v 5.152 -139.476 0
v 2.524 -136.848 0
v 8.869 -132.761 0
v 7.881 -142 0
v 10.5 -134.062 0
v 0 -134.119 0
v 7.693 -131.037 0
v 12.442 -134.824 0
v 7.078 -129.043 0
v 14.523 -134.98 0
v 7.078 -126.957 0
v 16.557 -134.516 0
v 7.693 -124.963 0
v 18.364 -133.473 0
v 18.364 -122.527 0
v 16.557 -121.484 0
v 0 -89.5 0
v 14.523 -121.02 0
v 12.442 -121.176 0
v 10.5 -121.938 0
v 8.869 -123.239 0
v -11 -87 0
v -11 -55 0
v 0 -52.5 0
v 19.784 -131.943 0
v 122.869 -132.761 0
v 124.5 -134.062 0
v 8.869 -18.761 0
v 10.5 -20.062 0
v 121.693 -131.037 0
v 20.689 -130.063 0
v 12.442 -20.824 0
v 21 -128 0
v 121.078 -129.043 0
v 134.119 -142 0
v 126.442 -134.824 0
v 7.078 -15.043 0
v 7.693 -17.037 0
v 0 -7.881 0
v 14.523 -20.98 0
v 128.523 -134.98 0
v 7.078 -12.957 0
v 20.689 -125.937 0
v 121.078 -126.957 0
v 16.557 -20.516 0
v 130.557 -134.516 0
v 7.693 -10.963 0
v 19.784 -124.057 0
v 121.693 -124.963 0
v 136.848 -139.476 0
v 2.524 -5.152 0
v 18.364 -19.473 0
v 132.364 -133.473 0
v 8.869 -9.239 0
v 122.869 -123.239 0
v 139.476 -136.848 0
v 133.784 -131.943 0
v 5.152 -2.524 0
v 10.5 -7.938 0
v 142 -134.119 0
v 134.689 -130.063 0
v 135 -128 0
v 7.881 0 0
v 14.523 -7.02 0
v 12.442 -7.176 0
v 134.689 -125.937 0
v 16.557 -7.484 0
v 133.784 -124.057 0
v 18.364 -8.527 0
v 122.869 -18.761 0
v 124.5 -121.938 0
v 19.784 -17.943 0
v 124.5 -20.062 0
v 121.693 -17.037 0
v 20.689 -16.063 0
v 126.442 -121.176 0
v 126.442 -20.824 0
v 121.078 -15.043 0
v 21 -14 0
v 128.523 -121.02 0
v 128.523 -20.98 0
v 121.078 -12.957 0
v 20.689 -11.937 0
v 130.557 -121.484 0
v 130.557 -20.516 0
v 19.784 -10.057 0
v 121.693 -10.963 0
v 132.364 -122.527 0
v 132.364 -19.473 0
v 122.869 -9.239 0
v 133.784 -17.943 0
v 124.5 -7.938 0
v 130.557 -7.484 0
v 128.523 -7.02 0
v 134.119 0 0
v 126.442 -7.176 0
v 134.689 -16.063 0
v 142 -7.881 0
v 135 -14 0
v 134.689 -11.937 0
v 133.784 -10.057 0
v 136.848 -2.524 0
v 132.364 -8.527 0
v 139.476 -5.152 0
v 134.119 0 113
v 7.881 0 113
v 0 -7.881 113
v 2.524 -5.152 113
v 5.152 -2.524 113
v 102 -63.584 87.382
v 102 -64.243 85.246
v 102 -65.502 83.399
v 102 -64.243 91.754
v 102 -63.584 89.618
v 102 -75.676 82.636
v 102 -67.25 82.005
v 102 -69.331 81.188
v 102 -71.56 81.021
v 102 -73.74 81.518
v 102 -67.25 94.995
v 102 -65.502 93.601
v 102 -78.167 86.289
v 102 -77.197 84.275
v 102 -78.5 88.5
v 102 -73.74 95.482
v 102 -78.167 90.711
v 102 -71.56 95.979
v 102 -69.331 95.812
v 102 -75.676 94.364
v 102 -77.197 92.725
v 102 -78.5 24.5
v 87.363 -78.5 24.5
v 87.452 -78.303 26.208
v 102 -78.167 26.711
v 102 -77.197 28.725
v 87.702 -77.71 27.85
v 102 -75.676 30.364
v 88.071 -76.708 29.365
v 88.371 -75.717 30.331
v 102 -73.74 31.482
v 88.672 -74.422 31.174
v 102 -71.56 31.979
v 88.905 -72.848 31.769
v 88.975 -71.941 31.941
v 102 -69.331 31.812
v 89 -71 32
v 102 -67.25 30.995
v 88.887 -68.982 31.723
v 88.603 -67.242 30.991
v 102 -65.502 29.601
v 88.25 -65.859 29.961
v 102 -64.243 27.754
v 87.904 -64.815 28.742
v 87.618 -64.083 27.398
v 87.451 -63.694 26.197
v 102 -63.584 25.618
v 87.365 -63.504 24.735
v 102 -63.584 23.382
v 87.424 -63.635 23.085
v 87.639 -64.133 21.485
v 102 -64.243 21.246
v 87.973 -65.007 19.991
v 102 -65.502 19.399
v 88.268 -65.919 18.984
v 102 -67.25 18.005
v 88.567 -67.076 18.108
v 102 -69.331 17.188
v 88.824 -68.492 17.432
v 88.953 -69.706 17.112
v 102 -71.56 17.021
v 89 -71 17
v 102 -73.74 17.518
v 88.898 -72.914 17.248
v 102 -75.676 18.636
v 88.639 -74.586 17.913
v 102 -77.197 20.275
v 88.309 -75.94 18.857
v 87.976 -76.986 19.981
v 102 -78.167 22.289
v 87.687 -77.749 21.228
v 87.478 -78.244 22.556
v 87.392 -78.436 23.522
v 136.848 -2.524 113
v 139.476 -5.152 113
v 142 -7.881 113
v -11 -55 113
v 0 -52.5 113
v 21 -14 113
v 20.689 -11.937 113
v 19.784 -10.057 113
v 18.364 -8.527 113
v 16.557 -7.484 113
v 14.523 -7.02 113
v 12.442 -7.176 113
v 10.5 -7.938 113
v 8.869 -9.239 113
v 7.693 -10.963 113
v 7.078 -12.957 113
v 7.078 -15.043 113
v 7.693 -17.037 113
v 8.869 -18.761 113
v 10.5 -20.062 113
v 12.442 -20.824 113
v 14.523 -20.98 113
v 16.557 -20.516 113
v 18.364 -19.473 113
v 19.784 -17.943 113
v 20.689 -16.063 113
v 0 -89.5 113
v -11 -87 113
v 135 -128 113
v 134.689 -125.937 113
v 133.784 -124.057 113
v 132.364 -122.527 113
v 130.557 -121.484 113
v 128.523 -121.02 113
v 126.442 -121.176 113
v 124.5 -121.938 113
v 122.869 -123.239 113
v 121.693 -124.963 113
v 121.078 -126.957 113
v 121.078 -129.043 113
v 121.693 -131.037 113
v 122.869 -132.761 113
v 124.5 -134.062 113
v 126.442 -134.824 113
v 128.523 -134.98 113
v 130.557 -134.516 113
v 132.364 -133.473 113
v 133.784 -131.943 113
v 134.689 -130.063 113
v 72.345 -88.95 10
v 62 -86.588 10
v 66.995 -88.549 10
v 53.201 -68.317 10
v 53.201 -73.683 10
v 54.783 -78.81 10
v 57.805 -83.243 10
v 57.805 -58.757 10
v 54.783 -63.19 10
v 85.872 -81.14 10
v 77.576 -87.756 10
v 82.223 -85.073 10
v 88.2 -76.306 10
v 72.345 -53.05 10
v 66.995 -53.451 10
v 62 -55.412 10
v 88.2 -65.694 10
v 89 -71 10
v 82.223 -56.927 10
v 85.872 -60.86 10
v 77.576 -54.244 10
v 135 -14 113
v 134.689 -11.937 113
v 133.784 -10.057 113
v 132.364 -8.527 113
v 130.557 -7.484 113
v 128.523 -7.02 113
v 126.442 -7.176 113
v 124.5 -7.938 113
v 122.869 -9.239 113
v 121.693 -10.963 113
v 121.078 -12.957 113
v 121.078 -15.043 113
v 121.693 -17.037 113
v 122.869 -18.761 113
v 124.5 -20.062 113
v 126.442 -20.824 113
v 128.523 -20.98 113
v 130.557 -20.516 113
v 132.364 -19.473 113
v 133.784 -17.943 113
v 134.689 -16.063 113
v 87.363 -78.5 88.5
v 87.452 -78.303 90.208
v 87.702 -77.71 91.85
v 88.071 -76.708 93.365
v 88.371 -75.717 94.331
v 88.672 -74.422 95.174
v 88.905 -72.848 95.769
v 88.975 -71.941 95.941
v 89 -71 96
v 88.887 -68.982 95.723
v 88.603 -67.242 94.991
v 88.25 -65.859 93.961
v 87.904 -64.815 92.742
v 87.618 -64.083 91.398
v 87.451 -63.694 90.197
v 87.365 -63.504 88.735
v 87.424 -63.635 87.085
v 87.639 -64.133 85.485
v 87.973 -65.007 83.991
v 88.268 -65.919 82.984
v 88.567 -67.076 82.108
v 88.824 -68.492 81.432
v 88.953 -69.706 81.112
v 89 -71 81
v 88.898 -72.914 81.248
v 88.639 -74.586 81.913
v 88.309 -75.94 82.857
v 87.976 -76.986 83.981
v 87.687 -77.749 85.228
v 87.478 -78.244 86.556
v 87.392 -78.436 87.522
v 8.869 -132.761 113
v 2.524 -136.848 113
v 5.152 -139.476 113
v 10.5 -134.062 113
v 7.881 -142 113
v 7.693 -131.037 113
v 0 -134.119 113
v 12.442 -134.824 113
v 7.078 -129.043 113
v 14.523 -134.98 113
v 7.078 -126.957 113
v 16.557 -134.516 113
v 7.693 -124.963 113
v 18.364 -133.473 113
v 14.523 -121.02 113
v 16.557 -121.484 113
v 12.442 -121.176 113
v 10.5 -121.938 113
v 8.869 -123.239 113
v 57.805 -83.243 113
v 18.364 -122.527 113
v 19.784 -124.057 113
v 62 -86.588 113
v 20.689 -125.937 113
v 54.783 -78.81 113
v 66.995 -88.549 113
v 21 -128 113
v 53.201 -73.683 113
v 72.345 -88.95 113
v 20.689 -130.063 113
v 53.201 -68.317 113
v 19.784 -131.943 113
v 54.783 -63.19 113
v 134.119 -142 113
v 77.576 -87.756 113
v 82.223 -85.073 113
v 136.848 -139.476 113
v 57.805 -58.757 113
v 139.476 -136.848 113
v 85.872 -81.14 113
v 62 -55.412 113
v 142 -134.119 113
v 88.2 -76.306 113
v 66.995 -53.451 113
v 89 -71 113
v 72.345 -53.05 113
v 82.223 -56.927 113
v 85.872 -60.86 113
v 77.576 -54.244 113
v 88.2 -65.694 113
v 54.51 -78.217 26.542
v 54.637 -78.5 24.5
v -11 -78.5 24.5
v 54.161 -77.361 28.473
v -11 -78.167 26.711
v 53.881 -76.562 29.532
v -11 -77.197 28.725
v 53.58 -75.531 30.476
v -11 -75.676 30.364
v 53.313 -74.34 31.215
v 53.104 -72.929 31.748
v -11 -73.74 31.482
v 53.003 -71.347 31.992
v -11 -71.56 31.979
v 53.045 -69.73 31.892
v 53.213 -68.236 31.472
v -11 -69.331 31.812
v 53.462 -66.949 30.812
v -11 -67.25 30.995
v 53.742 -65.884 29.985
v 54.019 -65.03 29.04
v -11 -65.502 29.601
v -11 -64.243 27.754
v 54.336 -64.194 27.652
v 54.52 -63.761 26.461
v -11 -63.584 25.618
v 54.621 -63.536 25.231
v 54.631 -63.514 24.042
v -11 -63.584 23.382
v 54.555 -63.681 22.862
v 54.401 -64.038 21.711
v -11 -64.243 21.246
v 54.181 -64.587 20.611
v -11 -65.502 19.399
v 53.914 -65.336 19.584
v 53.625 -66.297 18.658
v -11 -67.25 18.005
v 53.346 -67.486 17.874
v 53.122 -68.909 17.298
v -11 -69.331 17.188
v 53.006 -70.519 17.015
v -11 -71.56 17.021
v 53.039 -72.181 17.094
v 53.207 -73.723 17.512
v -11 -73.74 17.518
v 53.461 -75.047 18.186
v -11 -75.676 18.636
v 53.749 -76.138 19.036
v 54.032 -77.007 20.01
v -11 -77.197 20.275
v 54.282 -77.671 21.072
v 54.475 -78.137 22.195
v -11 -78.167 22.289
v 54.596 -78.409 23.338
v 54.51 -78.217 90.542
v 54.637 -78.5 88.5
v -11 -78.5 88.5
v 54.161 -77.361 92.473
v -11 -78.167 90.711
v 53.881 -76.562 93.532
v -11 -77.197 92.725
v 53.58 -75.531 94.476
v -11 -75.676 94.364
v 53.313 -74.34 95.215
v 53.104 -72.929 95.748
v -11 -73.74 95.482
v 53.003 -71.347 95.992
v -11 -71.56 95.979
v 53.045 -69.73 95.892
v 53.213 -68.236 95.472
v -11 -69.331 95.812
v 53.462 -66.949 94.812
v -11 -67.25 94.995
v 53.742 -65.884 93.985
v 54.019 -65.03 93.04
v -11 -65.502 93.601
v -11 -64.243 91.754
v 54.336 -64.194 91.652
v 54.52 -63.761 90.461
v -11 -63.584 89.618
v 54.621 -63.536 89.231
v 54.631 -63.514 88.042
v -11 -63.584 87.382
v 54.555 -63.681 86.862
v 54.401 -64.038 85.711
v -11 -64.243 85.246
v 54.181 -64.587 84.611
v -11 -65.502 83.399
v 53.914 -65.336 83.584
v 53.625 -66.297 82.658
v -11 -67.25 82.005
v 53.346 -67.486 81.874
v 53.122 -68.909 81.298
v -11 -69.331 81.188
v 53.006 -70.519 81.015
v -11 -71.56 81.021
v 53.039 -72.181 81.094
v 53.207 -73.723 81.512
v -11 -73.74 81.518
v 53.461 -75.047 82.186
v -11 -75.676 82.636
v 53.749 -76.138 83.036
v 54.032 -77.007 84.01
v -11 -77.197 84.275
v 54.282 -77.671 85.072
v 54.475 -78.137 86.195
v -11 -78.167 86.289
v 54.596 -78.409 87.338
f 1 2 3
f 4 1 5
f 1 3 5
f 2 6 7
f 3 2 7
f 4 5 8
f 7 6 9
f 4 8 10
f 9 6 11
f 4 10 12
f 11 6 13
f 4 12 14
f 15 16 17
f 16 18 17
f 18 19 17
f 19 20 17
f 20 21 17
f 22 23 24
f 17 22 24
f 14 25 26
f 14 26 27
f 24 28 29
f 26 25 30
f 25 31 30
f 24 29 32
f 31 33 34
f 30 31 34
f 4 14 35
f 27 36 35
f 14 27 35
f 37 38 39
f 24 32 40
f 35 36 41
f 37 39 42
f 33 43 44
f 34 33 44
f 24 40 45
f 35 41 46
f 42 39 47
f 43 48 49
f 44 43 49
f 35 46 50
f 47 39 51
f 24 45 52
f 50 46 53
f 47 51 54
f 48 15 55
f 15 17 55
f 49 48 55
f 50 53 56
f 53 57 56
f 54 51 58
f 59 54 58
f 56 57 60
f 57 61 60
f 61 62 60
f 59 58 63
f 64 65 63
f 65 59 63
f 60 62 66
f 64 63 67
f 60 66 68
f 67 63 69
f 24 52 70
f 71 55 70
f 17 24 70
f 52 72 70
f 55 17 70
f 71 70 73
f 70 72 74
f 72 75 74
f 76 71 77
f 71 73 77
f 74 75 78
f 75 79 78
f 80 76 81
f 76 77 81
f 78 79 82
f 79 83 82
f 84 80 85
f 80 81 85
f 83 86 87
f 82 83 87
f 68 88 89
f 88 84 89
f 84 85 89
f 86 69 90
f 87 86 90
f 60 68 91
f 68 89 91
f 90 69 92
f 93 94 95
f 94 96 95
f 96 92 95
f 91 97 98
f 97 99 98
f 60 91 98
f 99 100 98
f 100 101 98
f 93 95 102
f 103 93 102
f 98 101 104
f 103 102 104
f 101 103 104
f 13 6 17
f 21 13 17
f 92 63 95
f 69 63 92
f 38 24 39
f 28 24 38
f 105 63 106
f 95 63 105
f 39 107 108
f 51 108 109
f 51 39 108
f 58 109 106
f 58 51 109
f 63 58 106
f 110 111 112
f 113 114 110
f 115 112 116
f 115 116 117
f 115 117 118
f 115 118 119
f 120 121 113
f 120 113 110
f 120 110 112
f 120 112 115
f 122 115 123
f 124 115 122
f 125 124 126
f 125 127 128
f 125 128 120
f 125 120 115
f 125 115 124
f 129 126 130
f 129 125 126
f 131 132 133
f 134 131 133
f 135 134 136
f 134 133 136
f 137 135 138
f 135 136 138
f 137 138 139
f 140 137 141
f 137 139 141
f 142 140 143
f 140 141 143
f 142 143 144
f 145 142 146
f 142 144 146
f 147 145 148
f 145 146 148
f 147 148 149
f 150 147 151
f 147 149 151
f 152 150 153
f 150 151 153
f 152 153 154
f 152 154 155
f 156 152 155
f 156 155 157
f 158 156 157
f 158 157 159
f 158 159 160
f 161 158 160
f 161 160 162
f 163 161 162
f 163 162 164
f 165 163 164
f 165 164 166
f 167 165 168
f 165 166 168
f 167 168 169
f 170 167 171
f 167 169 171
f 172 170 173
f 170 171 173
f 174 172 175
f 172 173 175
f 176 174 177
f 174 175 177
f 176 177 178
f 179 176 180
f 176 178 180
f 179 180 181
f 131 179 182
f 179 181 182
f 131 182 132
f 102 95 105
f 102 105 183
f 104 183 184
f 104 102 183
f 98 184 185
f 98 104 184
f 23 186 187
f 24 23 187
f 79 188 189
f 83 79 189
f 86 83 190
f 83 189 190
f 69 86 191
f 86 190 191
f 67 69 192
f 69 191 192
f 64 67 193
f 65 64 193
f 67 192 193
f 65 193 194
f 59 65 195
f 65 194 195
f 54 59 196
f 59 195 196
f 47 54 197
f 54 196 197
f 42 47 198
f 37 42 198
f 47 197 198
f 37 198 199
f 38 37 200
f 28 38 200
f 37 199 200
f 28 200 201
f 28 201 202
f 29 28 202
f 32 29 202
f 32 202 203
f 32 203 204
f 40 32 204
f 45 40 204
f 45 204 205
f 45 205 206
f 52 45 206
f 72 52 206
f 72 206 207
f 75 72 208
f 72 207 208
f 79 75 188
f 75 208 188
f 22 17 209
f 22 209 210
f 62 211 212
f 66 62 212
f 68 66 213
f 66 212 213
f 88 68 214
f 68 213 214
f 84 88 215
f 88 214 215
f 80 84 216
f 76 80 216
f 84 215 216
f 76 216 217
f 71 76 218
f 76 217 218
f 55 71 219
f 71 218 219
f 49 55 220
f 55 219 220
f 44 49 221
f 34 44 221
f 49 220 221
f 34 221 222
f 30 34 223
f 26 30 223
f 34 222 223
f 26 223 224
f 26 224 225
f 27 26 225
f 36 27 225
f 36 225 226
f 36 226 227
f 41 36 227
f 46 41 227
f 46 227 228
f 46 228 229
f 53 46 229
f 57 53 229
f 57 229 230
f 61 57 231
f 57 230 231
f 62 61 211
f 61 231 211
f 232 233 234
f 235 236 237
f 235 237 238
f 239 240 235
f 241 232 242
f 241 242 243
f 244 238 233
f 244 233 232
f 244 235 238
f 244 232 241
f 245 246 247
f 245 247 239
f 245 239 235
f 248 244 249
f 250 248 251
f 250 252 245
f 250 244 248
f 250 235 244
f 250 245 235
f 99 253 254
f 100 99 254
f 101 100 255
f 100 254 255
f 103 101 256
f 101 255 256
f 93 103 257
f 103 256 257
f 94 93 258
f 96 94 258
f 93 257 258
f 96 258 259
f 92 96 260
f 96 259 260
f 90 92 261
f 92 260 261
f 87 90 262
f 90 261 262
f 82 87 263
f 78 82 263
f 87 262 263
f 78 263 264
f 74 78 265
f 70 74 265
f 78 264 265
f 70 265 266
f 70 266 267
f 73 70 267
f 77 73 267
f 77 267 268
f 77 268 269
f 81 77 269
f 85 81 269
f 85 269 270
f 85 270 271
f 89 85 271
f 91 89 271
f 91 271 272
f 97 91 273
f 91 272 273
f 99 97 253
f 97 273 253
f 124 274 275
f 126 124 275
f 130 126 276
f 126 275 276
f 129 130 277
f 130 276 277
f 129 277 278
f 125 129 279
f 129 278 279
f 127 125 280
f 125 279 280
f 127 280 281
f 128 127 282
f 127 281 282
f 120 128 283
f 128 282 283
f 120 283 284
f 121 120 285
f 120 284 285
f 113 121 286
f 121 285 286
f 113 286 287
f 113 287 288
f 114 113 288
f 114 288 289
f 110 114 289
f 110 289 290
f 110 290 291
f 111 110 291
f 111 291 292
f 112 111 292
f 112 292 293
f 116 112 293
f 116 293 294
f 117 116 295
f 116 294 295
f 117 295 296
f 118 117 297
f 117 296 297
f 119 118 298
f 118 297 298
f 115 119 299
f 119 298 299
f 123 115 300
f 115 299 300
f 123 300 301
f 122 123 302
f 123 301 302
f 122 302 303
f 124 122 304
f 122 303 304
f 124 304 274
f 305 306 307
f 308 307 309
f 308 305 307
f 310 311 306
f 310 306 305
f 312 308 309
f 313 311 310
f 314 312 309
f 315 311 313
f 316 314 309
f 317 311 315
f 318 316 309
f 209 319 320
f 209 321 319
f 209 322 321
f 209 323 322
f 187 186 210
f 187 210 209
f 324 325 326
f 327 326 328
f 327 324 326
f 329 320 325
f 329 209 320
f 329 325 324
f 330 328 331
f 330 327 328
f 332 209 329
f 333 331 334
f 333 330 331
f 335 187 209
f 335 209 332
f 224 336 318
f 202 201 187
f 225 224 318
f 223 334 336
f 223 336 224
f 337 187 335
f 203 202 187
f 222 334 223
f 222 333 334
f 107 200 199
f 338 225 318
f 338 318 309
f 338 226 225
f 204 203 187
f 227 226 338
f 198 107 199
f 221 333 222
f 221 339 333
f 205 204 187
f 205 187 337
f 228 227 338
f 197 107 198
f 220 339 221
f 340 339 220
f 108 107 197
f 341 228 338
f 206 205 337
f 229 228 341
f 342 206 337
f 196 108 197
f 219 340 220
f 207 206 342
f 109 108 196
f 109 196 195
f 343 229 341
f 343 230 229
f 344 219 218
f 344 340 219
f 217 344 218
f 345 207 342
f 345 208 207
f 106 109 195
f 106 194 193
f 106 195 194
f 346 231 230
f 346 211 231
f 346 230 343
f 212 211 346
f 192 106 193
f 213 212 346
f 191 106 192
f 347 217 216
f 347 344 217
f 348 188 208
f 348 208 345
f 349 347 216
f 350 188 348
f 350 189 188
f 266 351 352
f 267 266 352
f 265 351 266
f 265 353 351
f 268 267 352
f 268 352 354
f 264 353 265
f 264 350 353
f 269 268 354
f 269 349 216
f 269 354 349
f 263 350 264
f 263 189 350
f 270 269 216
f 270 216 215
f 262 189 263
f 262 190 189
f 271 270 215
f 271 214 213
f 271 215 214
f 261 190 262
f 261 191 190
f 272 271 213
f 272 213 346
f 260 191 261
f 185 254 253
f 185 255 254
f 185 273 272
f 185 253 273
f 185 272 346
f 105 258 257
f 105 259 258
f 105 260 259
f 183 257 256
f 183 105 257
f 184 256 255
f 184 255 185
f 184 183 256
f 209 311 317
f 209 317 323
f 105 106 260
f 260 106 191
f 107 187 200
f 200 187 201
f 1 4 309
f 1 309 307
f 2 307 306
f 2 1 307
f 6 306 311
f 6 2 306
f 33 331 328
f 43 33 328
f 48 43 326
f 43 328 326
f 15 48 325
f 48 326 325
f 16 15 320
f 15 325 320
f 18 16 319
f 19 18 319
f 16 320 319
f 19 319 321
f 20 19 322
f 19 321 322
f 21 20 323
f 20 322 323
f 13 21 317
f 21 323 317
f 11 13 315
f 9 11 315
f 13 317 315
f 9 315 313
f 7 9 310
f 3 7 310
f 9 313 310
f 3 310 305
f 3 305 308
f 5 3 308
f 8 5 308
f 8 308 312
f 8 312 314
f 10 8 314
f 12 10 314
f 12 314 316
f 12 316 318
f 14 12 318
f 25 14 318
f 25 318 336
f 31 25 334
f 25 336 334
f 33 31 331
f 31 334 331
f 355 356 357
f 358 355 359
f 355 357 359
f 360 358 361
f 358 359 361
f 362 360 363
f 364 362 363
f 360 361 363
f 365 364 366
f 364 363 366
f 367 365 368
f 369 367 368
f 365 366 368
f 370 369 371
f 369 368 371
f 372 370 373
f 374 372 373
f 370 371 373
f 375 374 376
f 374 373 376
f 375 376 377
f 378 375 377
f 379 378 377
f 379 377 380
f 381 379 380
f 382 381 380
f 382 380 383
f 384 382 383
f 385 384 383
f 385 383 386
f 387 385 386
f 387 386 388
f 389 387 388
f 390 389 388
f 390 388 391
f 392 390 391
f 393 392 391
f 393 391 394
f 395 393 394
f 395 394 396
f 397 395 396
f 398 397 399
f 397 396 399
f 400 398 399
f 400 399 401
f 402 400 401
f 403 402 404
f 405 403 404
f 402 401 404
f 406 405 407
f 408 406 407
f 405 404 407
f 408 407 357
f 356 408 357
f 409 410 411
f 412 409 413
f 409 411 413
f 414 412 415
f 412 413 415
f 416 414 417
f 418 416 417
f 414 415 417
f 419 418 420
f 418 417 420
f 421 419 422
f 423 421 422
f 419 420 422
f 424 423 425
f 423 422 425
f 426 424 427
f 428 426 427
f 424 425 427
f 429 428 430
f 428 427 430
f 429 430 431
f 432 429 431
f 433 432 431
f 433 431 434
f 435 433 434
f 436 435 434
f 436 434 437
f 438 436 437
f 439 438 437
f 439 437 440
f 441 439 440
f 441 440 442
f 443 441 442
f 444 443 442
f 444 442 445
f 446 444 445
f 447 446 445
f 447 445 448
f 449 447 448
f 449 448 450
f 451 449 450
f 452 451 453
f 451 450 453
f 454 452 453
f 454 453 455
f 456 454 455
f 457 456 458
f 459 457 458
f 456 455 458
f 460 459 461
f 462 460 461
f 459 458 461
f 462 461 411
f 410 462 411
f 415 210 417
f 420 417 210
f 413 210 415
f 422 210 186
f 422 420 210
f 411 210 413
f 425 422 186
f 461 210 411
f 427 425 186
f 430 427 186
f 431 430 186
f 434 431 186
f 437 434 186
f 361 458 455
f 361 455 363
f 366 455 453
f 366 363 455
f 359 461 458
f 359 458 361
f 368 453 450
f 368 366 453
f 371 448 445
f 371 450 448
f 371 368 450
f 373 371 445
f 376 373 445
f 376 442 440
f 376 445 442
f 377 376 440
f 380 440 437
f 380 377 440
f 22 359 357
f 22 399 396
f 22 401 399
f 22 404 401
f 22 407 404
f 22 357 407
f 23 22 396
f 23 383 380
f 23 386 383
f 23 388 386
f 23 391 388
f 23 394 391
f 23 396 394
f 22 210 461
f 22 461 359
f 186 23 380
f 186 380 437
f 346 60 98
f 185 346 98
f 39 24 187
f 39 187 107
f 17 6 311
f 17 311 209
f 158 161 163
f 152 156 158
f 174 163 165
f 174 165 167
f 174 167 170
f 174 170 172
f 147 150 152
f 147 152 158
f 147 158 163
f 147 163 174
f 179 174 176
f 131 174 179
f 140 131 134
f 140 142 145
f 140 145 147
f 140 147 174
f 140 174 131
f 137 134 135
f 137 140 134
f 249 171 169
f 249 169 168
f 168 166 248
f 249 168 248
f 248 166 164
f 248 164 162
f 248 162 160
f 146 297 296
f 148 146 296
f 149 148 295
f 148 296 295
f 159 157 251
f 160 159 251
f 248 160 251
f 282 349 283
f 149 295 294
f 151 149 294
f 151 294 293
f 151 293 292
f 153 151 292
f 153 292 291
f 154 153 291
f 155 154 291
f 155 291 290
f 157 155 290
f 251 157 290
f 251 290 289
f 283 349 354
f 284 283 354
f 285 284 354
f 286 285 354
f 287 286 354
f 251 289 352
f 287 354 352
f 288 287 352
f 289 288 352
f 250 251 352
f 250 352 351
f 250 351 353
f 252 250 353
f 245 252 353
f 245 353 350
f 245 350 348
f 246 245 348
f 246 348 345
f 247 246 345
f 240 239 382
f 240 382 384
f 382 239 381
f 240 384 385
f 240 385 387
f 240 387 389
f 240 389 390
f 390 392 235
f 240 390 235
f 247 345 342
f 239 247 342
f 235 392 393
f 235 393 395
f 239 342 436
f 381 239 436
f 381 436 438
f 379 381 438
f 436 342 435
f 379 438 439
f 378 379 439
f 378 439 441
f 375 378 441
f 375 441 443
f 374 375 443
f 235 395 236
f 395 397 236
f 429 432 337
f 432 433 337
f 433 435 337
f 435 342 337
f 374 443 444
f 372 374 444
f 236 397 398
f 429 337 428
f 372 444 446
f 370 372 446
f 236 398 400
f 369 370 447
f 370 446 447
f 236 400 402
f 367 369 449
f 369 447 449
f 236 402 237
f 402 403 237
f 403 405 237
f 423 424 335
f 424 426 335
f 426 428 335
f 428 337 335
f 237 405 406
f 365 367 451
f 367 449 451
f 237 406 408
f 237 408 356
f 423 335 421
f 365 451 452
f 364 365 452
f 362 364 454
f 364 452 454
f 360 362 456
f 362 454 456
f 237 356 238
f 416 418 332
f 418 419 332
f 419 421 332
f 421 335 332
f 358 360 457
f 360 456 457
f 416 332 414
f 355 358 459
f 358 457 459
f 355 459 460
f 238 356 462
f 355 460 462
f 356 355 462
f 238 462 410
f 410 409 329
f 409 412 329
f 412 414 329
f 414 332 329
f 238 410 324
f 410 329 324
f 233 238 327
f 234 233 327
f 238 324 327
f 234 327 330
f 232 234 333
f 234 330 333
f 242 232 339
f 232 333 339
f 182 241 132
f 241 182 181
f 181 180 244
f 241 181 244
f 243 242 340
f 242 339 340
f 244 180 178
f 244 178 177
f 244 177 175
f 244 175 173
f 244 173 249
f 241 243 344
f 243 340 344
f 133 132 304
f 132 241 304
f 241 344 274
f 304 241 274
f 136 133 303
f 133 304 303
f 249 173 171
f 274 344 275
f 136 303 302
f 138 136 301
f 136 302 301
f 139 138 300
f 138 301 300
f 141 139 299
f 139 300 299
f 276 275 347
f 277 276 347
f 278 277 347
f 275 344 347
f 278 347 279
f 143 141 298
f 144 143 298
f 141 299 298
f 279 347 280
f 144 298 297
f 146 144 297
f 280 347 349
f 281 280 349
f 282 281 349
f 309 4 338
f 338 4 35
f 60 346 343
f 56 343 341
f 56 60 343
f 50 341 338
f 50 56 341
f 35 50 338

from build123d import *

# Parameters (mm, degrees)
SKETCH_1_W          = 142
SKETCH_1_H          = 142
EXTRUDE_1_DEPTH     = 113
SKETCH_2_R          = 7
CUT_EXTRUDE_1_DEPTH = 113
SKETCH_3_R          = 18
CUT_EXTRUDE_2_DEPTH = 103
SKETCH_4_OUTSIDE_W  = 190.086
SKETCH_4_OUTSIDE_H  = 190.086
SKETCH_4_OUTSIDE_R  = 95
CUT_EXTRUDE_3_DEPTH = 231.427862899
EXTRUDE_2_DEPTH     = 113
SKETCH_6_R          = 7.5
CUT_EXTRUDE_4_DEPTH = 113


with BuildPart() as part:
    # 草图1 → 拉伸1 (new body)
    with BuildSketch(Plane.XY):
        with Locations((71, -71)):
            Rectangle(SKETCH_1_W, SKETCH_1_H)
    extrude(amount=EXTRUDE_1_DEPTH)

    # 草图2 → 切除-拉伸1 (cut)
    with BuildSketch(Plane.XY.offset(113)):
        with Locations((14, -14)):
            Circle(SKETCH_2_R)
        with Locations((128, -14)):
            Circle(SKETCH_2_R)
        with Locations((14, -128)):
            Circle(SKETCH_2_R)
        with Locations((128, -128)):
            Circle(SKETCH_2_R)
    extrude(amount=-CUT_EXTRUDE_1_DEPTH, mode=Mode.SUBTRACT)

    # 草图3 → 切除-拉伸2 (cut)
    with BuildSketch(Plane.XY.offset(113)):
        with Locations((71, -71)):
            Circle(SKETCH_3_R)
    extrude(amount=-CUT_EXTRUDE_2_DEPTH, mode=Mode.SUBTRACT)

    # 草图4 outside → 切除-拉伸3 (cut, through all)
    with BuildSketch(Plane(origin=(0, 0, 0), x_dir=(-1, 0, 0), z_dir=(0, 0, -1))):
        with Locations((-71, -71)):
            Rectangle(SKETCH_4_OUTSIDE_W, SKETCH_4_OUTSIDE_H)
        with Locations((-71, -71)):
            Circle(SKETCH_4_OUTSIDE_R, mode=Mode.SUBTRACT)
    extrude(amount=-CUT_EXTRUDE_3_DEPTH, mode=Mode.SUBTRACT)

    # 草图5 → 拉伸2 (add)
    with BuildSketch(Plane(origin=(0, 0, 0), x_dir=(-1, 0, 0), z_dir=(0, 0, -1))):
        Polygon((11, -55), (0, -52.5), (0, -55), (0, -87), (0, -89.5), (11, -87), align=None)
    extrude(amount=-EXTRUDE_2_DEPTH)

    # 草图6 → 切除-拉伸4 (cut)
    with BuildSketch(Plane.ZY.offset(11)):
        with Locations(Location((24.5, -71, 0), (0, 0, 270))):
            Circle(SKETCH_6_R)
        with Locations(Location((88.5, -71, 0), (0, 0, 270))):
            Circle(SKETCH_6_R)
    extrude(amount=-CUT_EXTRUDE_4_DEPTH, mode=Mode.SUBTRACT)


solid = part.part
